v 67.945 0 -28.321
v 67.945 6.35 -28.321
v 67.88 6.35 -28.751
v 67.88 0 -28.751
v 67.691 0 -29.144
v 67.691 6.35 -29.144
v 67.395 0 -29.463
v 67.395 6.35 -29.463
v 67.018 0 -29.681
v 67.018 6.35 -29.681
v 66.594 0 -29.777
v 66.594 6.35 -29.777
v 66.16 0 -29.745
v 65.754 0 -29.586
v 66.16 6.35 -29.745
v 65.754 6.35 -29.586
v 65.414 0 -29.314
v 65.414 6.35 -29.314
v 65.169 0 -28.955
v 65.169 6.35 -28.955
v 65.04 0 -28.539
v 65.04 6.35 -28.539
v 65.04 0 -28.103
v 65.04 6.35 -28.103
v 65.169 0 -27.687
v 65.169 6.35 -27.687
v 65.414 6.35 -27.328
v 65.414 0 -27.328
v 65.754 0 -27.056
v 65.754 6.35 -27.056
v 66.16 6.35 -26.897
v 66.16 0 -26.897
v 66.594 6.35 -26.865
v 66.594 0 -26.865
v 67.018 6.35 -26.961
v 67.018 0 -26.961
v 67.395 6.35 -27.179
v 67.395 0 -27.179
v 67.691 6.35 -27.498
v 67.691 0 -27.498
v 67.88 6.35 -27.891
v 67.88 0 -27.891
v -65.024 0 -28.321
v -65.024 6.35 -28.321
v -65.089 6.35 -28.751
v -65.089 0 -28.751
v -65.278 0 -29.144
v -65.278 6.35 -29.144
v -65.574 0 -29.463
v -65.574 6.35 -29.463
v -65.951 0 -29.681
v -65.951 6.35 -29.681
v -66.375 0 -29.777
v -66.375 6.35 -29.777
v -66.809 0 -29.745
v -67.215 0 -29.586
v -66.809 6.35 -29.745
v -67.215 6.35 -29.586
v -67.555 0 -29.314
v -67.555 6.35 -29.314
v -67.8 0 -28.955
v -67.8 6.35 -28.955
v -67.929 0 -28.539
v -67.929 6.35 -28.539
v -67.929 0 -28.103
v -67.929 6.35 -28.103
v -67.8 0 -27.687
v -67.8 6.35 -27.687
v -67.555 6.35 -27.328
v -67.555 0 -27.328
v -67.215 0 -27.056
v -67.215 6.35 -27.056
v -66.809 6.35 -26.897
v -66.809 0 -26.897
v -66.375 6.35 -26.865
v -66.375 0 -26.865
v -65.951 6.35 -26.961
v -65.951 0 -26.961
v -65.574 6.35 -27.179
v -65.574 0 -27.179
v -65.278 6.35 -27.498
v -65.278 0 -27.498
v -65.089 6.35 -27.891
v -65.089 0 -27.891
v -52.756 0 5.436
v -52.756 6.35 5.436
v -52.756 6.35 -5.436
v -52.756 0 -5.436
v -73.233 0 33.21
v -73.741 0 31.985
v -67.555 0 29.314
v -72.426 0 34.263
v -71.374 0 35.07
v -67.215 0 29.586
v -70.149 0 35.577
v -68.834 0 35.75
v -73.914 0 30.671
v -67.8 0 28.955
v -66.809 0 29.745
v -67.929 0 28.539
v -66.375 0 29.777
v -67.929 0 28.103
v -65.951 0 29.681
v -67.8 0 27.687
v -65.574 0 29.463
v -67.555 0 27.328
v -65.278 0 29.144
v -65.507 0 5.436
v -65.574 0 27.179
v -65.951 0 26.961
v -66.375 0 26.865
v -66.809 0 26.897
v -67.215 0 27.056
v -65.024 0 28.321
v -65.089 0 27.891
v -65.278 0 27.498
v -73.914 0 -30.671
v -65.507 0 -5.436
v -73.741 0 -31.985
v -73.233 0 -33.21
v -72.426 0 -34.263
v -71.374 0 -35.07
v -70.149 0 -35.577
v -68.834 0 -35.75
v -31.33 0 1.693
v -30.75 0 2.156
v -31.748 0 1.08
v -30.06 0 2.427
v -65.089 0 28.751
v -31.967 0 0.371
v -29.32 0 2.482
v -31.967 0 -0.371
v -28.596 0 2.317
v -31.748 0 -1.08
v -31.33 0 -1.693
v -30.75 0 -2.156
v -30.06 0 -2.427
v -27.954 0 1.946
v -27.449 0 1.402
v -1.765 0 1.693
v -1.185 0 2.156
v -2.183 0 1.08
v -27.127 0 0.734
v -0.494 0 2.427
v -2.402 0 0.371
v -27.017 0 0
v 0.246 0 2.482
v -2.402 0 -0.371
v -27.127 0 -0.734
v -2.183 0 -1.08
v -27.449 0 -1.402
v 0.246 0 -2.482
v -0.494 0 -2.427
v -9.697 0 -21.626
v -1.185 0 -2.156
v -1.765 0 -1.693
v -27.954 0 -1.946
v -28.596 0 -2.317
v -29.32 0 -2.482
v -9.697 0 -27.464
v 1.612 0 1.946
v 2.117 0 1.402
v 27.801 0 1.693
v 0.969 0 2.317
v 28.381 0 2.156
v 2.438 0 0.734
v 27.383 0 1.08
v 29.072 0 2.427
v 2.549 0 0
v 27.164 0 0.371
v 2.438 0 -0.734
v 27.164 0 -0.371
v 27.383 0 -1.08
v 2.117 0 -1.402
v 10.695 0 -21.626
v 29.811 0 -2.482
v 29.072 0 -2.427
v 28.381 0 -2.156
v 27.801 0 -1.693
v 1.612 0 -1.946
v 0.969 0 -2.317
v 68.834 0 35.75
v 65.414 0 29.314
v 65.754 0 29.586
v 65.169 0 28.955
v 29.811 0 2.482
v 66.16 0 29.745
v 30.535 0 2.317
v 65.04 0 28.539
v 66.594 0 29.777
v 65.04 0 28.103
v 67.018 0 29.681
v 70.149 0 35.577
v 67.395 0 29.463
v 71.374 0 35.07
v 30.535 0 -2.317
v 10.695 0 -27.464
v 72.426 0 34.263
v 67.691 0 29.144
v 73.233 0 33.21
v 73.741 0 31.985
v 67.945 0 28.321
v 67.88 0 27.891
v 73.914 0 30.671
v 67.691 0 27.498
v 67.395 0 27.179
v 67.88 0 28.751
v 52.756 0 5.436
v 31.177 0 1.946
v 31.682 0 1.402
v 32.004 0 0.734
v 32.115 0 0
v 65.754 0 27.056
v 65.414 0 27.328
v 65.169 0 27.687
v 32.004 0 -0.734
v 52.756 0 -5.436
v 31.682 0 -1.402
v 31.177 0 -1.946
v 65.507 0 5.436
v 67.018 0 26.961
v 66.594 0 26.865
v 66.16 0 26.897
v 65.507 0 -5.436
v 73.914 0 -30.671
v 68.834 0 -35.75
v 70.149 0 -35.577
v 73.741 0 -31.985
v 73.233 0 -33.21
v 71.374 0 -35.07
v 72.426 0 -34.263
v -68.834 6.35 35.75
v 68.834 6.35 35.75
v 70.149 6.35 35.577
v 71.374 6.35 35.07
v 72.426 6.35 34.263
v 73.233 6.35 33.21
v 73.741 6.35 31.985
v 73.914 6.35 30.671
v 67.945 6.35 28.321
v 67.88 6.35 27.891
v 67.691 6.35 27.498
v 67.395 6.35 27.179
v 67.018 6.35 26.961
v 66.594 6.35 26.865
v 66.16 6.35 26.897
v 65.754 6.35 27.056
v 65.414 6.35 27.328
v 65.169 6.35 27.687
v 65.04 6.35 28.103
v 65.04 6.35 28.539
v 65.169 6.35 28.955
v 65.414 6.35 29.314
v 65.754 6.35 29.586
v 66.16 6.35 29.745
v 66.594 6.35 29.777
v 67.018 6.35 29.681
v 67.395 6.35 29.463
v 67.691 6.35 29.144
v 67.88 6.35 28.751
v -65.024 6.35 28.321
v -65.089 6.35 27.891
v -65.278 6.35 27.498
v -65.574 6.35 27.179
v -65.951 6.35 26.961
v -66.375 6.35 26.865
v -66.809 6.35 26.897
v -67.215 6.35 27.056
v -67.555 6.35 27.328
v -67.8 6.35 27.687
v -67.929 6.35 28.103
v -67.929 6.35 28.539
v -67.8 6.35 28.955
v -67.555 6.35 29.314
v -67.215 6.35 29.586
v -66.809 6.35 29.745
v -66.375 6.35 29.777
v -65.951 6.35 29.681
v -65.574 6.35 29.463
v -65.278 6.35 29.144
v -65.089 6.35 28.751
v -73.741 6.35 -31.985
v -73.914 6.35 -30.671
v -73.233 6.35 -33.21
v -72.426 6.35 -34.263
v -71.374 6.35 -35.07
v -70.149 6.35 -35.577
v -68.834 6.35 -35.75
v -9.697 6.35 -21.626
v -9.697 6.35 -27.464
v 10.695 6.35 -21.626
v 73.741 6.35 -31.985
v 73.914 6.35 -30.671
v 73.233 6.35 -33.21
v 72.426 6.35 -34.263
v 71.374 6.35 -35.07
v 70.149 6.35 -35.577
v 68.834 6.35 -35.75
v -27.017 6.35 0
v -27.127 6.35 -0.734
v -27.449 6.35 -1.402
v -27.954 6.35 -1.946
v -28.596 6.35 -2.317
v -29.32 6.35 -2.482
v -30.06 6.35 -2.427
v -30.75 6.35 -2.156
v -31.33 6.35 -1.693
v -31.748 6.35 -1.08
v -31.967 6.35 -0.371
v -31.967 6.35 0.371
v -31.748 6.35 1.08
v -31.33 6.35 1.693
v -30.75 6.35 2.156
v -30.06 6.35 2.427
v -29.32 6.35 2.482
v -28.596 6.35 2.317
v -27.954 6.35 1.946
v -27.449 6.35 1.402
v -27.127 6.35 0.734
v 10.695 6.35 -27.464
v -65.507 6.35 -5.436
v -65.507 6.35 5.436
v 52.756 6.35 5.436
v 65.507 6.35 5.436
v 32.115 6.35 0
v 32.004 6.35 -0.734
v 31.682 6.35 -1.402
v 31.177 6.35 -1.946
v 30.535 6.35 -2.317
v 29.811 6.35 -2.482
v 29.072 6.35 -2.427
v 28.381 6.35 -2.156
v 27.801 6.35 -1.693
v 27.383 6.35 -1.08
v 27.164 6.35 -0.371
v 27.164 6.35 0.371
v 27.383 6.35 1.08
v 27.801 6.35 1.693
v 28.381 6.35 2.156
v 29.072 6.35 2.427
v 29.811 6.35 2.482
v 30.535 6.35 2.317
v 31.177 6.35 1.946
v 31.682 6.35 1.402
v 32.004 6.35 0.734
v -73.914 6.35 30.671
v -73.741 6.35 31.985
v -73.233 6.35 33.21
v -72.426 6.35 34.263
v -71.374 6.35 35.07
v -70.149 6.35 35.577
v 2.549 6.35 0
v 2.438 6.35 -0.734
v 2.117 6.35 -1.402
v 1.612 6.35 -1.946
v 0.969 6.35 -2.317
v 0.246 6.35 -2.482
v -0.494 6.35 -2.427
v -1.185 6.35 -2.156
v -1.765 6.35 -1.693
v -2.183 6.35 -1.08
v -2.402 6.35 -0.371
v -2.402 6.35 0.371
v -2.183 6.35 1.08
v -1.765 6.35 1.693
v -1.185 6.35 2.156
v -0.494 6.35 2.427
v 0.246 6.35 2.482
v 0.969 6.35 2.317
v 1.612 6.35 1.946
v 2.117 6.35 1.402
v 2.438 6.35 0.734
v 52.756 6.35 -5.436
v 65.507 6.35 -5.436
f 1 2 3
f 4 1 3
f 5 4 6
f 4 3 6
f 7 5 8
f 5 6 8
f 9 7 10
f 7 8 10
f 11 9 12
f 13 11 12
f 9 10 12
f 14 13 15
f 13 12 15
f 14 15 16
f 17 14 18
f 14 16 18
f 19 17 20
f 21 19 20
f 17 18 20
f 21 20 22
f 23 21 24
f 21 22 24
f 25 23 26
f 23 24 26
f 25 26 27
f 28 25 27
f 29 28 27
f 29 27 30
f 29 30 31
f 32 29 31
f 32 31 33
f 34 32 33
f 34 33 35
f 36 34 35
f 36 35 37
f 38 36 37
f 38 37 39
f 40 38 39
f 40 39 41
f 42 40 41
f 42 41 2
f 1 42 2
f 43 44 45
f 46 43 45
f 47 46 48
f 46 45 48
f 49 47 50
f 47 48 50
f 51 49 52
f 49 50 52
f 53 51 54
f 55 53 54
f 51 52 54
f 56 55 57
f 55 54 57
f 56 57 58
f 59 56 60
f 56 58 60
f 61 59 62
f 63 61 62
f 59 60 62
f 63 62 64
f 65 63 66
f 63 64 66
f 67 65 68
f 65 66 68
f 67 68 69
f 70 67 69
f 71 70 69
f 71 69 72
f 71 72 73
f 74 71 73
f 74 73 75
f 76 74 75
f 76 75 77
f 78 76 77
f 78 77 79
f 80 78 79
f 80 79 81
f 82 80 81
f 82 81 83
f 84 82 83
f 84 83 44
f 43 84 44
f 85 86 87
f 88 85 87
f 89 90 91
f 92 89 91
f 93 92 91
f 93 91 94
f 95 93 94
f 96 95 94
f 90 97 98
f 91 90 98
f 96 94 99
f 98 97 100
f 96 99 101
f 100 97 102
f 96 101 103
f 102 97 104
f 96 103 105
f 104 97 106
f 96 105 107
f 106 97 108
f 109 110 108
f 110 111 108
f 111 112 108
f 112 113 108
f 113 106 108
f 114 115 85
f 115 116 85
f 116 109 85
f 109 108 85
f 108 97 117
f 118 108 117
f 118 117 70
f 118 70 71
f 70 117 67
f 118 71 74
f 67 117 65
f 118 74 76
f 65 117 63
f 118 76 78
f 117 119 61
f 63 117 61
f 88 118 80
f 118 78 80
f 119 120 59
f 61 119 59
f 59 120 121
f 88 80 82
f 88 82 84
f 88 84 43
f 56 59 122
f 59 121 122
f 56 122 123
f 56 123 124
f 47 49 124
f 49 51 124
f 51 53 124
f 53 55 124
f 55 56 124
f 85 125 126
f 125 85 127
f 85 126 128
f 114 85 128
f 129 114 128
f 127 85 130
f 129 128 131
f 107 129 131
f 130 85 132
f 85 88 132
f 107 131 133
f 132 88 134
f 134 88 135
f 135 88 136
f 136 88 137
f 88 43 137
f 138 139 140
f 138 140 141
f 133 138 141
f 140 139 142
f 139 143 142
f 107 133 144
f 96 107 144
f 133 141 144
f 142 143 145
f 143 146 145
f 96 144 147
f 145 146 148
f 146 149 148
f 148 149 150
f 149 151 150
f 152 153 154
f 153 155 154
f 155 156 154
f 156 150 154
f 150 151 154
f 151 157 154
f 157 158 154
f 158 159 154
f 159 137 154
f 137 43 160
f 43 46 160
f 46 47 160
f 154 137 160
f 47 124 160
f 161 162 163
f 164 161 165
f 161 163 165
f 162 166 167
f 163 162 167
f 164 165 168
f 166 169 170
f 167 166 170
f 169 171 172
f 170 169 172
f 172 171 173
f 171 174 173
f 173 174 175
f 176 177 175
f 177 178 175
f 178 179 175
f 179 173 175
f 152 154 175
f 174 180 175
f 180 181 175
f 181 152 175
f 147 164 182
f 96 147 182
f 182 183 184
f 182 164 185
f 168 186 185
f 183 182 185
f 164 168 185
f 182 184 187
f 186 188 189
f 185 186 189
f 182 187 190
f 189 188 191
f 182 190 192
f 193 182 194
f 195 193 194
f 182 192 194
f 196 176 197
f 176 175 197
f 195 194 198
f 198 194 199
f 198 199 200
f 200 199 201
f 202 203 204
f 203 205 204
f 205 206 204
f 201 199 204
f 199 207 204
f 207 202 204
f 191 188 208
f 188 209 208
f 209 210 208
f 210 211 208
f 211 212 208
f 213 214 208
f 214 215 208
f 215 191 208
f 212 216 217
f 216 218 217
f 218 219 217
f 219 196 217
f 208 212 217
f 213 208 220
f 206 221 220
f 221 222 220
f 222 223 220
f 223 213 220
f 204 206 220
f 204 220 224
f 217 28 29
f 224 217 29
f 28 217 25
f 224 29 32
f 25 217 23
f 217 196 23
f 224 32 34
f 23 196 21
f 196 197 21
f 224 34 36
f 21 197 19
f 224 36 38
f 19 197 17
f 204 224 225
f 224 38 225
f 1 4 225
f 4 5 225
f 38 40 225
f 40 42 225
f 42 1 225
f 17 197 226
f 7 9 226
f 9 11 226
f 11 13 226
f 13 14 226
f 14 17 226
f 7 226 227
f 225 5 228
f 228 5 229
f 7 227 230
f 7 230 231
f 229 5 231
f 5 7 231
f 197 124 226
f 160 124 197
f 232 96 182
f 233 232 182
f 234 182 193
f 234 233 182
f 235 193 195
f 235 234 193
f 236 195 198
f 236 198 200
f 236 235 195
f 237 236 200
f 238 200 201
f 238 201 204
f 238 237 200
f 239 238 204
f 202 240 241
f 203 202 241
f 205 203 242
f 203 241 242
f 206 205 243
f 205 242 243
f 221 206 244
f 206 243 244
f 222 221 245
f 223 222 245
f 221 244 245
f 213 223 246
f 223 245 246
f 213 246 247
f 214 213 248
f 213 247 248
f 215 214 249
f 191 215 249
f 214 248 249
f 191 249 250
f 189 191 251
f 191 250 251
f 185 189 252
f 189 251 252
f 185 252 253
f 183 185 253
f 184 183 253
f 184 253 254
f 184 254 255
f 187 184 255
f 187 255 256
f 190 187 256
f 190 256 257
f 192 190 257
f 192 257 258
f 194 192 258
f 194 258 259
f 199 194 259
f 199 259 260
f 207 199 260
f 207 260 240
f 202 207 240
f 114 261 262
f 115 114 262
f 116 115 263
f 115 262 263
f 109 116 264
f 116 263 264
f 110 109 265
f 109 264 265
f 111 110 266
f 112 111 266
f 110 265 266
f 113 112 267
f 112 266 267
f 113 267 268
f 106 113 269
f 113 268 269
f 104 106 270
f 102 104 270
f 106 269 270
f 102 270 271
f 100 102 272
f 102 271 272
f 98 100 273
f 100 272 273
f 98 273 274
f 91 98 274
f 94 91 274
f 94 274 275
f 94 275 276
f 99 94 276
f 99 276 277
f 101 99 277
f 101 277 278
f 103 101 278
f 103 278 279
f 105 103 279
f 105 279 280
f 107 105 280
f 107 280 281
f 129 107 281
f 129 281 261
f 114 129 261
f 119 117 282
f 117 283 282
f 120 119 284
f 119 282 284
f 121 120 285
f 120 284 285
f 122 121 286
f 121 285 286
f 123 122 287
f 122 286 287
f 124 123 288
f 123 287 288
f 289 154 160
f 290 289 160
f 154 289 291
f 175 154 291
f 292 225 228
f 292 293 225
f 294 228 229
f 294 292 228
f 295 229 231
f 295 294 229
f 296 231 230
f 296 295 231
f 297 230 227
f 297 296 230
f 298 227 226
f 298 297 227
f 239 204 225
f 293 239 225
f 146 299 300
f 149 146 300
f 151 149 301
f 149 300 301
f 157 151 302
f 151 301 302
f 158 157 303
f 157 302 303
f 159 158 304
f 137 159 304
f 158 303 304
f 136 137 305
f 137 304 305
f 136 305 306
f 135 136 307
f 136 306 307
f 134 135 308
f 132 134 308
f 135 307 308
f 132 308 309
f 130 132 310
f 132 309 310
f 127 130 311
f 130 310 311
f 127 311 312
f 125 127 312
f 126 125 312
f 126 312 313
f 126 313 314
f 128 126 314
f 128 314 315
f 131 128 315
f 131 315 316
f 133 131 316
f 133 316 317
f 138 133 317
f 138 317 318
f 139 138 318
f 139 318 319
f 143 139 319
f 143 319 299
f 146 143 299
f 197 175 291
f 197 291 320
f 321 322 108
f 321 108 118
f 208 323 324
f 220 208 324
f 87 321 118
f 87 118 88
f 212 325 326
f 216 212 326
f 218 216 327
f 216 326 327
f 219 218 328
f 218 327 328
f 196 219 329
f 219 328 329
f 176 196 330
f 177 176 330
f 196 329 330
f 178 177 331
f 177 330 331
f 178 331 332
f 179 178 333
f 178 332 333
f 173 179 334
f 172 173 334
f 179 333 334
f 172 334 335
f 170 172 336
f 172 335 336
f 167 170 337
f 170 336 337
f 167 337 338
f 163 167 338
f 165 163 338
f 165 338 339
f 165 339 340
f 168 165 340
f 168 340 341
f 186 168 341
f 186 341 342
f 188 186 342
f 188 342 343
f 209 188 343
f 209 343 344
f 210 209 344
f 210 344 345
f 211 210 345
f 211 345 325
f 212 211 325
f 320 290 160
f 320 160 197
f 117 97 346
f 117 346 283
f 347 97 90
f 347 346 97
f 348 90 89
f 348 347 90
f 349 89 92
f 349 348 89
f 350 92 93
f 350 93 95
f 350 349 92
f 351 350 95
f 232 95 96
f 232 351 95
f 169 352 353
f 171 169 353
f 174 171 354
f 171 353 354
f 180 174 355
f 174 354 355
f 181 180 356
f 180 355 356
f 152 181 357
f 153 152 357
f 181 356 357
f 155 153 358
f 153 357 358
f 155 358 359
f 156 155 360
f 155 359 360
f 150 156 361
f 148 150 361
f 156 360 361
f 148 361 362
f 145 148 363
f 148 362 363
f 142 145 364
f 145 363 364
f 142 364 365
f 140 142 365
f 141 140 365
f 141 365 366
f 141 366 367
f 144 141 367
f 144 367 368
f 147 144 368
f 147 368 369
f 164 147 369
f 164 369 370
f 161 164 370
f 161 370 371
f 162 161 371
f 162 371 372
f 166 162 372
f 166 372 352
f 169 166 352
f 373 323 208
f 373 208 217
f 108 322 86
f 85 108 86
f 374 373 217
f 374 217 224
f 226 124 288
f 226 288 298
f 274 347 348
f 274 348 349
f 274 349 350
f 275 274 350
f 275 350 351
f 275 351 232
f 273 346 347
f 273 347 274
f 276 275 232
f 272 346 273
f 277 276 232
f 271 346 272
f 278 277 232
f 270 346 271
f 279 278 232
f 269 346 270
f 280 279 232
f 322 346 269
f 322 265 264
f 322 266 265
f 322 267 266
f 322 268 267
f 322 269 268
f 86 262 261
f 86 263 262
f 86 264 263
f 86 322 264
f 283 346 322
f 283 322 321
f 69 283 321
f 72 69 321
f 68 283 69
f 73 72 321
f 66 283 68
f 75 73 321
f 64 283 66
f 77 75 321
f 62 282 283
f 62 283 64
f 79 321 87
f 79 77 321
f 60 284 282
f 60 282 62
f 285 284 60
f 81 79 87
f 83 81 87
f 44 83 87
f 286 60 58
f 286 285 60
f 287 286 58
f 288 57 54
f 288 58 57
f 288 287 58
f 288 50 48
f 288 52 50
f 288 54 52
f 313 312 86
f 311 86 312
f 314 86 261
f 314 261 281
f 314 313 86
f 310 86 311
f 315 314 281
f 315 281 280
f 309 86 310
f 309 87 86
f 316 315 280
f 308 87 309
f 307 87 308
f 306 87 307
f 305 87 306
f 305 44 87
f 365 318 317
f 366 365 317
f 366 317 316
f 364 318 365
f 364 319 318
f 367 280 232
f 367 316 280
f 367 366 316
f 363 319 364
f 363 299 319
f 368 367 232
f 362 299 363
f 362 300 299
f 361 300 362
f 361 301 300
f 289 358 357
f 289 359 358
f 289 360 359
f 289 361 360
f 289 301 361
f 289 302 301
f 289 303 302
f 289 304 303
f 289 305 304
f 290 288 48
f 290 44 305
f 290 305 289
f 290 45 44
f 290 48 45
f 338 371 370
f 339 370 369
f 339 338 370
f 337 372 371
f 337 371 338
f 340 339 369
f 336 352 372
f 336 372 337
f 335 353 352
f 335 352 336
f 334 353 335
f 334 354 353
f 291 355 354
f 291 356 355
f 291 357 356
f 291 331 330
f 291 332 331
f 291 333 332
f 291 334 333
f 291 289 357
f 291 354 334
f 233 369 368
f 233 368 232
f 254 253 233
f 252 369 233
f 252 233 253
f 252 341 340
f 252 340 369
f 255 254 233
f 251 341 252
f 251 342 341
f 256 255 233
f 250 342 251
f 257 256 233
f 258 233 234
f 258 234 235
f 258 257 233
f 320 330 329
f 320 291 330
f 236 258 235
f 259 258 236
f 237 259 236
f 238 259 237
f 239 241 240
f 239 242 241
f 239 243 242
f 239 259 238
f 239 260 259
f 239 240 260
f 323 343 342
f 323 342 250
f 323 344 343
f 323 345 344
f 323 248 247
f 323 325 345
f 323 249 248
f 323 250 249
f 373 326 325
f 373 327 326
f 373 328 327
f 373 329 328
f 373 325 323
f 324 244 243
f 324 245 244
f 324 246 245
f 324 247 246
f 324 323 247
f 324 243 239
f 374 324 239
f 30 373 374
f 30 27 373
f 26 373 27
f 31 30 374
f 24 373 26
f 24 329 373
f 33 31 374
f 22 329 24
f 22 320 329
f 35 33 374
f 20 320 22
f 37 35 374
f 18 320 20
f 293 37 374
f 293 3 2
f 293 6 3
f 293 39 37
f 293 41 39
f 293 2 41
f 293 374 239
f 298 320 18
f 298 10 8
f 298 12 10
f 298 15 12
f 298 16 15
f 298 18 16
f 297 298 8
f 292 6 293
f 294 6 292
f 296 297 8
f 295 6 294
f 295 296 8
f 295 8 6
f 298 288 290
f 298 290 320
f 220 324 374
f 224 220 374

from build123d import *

# Parameters (mm, degrees)
SKETCH1_W           = 147.828
SKETCH1_H           = 71.501
BOSS_EXTRUDE1_DEPTH = 6.35
FILLET1_R           = 5.08
SKETCH2_R           = 2.4892
SKETCH2_W           = 12.7508
SKETCH2_H           = 10.8712
CUT_EXTRUDE1_DEPTH  = 7.35
SKETCH3_R           = 1.4605
CUT_EXTRUDE2_DEPTH  = 7.35
SKETCH5_W           = 20.391623785
SKETCH5_H           = 5.837943421
CUT_EXTRUDE3_DEPTH  = 7.35


with BuildPart() as part:
    # Sketch1 → Boss-Extrude1 (new body)
    with BuildSketch(Plane(origin=(0, 0, 0), x_dir=(1, 0, 0), z_dir=(0, 1, 0))):
        Rectangle(SKETCH1_W, SKETCH1_H)
    extrude(amount=BOSS_EXTRUDE1_DEPTH)

    # Fillet1
    fillet1_edges = [part.edges().sort_by_distance(p)[0] for p in [
        (73.914, 3.175, 35.7505),
        (-73.914, 3.175, 35.7505),
        (-73.914, 3.175, -35.7505),
        (73.914, 3.175, -35.7505),
    ]]
    fillet(fillet1_edges, radius=FILLET1_R)

    # Sketch2 → Cut-Extrude1 (cut, through all)
    with BuildSketch(Plane(origin=(0, 6.35, 0), x_dir=(1, 0, 0), z_dir=(0, 1, 0))):
        with Locations((-29.505731413, 0)):
            Circle(SKETCH2_R)
        with Locations((29.625468587, 0)):
            Circle(SKETCH2_R)
        with Locations((0.059868587, 0)):
            Circle(SKETCH2_R)
        with Locations((59.1312, 0)):
            Rectangle(SKETCH2_W, SKETCH2_H)
        with Locations((-59.1312, 0)):
            Rectangle(SKETCH2_W, SKETCH2_H)
    extrude(amount=-CUT_EXTRUDE1_DEPTH, mode=Mode.SUBTRACT)

    # Sketch3 → Cut-Extrude2 (cut, through all)
    with BuildSketch(Plane(origin=(0, 6.35, 0), x_dir=(1, 0, 0), z_dir=(0, 1, 0))):
        with Locations((-66.4845, 28.321)):
            Circle(SKETCH3_R)
        with Locations((66.4845, 28.321)):
            Circle(SKETCH3_R)
        with Locations((66.4845, -28.321)):
            Circle(SKETCH3_R)
        with Locations((-66.4845, -28.321)):
            Circle(SKETCH3_R)
    extrude(amount=-CUT_EXTRUDE2_DEPTH, mode=Mode.SUBTRACT)

    # Sketch5 → Cut-Extrude3 (cut, through all)
    with BuildSketch(Plane(origin=(0, 6.35, 0), x_dir=(1, 0, 0), z_dir=(0, 1, 0))):
        with Locations((0.498877124, 24.544882744)):
            Rectangle(SKETCH5_W, SKETCH5_H)
    extrude(amount=-CUT_EXTRUDE3_DEPTH, mode=Mode.SUBTRACT)


solid = part.part
